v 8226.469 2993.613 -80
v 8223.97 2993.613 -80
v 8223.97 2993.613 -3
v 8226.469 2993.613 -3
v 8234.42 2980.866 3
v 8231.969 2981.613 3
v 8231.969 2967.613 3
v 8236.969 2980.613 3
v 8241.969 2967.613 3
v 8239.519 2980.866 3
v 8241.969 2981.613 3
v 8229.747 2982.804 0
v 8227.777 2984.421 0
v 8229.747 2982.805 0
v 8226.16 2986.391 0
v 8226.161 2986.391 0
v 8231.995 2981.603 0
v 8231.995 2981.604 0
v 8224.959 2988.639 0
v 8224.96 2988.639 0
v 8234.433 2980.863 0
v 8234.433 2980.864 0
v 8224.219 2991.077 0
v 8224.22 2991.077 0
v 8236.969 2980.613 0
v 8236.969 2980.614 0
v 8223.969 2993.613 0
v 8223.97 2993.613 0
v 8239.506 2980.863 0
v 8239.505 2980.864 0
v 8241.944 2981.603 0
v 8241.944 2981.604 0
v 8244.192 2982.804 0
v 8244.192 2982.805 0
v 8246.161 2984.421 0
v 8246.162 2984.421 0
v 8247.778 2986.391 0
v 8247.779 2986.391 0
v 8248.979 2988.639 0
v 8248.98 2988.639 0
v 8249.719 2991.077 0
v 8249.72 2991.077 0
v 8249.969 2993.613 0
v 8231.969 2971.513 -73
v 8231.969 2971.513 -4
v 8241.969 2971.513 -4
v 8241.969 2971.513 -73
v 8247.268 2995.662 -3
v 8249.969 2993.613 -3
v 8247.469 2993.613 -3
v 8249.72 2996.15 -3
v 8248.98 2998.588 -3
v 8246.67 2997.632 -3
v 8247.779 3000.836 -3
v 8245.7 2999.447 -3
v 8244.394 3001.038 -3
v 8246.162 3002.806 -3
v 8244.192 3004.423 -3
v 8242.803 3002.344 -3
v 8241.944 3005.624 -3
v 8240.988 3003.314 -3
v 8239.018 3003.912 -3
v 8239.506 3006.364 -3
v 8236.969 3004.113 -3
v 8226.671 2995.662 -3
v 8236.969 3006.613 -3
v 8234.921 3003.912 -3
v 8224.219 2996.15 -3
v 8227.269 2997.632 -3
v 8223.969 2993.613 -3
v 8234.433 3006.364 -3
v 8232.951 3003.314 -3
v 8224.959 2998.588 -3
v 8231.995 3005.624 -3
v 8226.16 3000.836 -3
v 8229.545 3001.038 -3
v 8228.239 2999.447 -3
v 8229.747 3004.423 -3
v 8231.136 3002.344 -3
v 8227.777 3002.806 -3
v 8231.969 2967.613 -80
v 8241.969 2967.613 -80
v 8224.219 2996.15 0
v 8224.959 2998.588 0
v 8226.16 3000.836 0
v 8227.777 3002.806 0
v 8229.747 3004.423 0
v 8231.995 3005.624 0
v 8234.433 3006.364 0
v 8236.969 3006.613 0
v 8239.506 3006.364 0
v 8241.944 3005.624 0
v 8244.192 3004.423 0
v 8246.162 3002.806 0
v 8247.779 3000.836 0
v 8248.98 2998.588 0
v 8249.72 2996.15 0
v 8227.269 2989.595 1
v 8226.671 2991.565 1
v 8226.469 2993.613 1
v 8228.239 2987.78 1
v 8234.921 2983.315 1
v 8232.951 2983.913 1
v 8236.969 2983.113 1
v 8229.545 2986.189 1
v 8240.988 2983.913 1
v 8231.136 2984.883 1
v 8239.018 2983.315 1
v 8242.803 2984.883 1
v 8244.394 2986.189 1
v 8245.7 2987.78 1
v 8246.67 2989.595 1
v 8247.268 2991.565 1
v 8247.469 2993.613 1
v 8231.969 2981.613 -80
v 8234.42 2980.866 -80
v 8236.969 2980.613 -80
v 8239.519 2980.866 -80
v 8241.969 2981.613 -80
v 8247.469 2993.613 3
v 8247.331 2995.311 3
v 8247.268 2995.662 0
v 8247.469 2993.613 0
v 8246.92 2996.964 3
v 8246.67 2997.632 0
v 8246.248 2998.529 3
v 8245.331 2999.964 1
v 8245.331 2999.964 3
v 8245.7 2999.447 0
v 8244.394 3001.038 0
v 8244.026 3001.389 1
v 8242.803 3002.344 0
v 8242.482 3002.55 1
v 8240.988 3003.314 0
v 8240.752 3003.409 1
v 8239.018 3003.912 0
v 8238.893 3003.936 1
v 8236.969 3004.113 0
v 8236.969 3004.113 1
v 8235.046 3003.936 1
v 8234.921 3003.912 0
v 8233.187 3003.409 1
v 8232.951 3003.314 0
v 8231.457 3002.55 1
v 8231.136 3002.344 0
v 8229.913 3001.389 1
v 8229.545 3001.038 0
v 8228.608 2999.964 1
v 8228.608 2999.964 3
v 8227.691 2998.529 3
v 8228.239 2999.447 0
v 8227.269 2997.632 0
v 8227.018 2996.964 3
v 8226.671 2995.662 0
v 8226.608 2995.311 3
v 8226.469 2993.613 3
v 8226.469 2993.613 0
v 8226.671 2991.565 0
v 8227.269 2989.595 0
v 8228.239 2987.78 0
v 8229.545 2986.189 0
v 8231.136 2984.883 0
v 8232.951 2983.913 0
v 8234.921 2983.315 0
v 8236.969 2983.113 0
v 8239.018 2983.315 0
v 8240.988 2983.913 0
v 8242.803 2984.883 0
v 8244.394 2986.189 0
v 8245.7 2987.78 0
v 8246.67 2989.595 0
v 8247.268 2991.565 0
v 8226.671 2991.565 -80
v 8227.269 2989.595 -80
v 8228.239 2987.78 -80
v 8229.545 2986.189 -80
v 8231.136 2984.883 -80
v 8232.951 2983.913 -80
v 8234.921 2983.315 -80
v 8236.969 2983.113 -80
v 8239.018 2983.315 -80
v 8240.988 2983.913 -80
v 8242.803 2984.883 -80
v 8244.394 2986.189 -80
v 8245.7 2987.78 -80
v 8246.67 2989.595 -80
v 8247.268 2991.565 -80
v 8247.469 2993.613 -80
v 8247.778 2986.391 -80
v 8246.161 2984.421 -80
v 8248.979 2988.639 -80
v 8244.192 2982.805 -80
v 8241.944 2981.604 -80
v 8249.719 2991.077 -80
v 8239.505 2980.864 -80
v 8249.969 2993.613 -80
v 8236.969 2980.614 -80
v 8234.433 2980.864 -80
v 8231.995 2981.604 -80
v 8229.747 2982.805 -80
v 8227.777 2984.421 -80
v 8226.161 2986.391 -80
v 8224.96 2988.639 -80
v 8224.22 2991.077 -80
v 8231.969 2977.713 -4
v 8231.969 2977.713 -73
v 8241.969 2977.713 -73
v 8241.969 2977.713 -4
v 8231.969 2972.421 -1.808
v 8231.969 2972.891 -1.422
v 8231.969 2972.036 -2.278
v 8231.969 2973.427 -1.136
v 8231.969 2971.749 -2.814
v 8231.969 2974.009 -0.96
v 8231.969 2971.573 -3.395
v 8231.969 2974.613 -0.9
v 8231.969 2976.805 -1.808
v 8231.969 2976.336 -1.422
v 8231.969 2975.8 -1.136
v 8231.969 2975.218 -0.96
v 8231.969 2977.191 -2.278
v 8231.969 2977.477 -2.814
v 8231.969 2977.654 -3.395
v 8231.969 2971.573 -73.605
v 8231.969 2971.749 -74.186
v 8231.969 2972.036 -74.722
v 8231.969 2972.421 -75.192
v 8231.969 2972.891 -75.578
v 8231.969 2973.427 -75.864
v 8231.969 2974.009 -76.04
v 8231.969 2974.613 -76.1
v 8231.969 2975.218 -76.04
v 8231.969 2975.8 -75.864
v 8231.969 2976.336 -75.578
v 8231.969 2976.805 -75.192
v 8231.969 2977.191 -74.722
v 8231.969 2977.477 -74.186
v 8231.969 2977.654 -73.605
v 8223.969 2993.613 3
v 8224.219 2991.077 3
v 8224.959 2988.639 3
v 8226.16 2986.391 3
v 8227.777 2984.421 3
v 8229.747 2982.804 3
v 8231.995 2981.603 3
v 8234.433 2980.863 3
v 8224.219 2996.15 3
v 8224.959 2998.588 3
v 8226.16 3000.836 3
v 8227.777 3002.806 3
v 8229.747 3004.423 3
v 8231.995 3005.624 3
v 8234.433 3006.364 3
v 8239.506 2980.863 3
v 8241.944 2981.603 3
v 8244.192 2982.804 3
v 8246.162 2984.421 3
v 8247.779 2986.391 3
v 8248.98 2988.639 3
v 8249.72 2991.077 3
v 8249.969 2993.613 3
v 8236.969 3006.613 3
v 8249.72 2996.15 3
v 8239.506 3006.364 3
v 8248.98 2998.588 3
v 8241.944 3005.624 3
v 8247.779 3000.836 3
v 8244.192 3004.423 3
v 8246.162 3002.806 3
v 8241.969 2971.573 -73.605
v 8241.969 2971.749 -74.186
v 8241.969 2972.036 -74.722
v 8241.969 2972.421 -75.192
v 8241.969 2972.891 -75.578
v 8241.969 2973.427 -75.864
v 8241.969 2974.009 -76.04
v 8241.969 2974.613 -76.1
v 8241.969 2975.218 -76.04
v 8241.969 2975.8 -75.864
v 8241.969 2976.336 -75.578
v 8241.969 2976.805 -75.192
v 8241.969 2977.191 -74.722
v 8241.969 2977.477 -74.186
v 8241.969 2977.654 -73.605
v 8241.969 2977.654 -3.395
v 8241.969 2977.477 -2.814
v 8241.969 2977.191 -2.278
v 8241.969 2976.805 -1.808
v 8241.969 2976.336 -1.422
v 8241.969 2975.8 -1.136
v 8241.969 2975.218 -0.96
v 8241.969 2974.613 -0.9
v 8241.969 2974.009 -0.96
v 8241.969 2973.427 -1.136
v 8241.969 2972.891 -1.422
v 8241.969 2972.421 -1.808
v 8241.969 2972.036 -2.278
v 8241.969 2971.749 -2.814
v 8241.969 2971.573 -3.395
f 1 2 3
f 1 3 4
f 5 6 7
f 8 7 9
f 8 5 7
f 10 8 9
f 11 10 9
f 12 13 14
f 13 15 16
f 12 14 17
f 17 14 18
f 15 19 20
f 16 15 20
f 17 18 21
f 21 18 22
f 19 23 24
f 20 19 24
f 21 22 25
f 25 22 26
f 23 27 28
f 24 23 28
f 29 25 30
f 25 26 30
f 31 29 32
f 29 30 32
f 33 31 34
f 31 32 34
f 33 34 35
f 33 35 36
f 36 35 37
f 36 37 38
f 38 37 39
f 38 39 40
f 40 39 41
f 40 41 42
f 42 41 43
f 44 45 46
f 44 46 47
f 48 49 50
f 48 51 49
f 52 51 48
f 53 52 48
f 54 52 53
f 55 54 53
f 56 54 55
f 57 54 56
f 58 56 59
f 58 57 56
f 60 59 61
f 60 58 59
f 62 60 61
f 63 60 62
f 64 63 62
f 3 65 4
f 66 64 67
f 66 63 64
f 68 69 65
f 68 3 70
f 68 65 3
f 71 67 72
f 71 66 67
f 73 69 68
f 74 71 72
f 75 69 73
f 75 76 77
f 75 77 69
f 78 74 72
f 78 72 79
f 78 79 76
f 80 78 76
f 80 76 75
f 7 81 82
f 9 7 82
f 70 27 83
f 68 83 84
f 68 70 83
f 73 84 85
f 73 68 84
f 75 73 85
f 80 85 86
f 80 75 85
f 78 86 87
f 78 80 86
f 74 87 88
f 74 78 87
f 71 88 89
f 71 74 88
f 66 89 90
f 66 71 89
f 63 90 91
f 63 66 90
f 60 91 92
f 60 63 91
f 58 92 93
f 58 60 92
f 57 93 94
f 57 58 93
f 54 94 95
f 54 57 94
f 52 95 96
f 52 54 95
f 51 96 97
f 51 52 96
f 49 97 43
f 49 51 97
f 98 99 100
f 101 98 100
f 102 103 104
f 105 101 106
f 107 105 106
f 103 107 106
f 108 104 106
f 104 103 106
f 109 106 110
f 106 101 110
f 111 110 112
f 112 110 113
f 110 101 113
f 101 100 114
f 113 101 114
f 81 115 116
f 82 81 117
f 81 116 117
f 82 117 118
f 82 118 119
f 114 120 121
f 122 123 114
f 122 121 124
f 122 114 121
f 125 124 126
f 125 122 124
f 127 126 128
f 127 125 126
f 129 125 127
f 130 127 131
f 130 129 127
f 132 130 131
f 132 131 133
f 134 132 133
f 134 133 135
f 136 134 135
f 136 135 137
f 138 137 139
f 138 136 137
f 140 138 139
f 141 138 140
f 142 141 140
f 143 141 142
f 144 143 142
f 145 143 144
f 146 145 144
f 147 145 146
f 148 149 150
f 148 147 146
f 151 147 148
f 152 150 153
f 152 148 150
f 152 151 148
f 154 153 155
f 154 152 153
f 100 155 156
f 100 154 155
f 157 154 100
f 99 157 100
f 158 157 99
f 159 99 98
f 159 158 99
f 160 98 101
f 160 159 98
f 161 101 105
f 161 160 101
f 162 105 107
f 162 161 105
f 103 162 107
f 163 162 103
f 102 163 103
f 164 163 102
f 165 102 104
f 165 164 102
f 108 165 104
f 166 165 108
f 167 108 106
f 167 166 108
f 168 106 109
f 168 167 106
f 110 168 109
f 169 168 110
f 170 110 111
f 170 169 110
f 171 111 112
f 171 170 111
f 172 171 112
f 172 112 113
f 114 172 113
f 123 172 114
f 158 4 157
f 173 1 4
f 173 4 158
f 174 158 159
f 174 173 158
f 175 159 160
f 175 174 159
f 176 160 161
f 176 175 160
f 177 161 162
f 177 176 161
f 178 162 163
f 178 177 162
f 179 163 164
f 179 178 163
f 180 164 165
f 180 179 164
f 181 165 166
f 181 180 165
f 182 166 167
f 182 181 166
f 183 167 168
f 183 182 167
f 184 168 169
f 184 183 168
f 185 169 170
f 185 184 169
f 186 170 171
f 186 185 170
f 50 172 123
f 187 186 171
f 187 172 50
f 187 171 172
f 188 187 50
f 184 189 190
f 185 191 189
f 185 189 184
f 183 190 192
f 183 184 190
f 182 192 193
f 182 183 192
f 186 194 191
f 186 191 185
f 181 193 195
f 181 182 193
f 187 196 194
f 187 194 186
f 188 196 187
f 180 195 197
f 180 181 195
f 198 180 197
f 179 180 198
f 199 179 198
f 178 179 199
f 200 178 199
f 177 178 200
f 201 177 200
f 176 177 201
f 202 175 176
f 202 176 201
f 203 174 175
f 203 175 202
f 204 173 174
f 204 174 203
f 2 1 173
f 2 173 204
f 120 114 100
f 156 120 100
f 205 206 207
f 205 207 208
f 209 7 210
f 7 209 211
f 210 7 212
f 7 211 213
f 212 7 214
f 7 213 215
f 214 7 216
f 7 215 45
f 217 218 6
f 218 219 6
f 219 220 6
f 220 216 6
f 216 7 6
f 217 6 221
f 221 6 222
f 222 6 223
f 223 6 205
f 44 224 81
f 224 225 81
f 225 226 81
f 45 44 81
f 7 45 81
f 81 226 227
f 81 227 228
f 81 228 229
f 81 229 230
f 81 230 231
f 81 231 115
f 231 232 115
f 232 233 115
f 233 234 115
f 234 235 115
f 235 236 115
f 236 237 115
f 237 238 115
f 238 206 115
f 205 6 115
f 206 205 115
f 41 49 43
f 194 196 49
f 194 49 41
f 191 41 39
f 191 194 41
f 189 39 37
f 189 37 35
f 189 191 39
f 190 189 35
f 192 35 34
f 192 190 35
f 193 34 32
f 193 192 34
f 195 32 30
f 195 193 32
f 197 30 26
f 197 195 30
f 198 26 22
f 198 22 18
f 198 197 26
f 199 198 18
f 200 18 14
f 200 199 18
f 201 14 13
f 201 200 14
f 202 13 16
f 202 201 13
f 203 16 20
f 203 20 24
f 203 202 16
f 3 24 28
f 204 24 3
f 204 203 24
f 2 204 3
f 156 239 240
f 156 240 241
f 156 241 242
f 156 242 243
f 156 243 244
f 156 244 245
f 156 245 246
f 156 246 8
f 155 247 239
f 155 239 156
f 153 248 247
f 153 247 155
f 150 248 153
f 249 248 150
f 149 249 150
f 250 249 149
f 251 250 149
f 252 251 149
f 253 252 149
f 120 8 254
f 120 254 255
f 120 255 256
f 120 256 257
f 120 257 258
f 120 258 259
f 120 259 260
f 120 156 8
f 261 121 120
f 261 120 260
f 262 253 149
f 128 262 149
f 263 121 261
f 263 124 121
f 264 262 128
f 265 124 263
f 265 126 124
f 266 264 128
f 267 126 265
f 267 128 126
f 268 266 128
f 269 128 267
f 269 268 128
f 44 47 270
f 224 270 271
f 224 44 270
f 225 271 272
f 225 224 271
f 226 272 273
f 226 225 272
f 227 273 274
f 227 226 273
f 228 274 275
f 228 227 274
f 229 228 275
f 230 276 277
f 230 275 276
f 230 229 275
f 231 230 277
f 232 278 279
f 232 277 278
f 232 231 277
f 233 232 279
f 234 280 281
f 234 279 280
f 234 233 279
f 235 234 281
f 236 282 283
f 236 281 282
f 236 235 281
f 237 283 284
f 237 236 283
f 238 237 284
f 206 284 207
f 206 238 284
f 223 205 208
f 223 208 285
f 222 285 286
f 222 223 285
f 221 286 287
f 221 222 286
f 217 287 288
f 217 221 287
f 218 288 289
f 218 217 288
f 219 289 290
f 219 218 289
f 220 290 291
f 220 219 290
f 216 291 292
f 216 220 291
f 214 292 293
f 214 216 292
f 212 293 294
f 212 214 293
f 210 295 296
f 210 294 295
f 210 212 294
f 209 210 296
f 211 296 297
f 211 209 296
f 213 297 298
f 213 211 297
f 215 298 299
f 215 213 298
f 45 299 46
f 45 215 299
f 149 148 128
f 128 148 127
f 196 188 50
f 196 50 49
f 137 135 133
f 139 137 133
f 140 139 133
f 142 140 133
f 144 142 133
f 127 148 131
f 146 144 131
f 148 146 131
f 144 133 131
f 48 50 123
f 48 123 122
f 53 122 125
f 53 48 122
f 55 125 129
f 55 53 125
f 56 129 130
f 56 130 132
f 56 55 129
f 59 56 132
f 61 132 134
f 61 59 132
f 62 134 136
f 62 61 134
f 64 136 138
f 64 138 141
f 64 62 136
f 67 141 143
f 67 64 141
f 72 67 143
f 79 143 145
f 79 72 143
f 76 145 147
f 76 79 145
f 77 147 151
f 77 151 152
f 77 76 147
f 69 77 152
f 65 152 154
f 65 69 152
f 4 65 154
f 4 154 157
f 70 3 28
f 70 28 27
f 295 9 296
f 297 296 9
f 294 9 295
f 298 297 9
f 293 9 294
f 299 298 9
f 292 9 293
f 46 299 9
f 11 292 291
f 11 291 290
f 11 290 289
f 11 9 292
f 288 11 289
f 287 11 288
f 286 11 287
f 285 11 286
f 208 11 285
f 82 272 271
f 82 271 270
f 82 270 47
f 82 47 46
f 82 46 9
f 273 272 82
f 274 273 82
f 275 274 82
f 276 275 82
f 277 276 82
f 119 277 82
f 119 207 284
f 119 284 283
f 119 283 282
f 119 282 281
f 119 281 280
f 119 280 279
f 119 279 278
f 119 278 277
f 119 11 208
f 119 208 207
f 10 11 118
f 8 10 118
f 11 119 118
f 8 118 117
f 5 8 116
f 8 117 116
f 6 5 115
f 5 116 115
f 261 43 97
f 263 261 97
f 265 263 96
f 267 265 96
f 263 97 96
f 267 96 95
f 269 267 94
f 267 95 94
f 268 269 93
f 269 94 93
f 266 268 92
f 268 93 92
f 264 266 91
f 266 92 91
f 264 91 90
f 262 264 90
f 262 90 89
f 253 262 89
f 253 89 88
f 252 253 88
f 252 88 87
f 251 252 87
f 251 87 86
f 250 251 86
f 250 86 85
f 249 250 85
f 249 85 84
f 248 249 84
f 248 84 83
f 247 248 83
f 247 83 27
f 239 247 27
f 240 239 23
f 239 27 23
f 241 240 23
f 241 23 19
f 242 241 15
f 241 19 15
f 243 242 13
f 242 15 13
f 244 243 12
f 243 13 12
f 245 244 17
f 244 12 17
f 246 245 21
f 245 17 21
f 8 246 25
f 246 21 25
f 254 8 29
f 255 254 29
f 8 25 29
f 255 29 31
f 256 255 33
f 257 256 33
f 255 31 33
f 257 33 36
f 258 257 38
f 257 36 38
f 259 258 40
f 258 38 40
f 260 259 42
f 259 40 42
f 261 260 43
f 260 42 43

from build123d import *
from build123d.topology import SkipClean

# Parameters (mm, degrees)
SKETCH_2_R       = 13
SKETCH_2_R_2     = 10.5
EXTRUDE_1_DEPTH  = 3
EXTRUDE_START    = -2
EXTRUDE_3_DEPTH  = 2
EXTRUDE_START_2  = 80
EXTRUDE_5_DEPTH  = 80
EXTRUDE_START_3  = 3
EXTRUDE_6_DEPTH  = 3
SKETCH_7_W       = 10
SKETCH_7_H       = 83
EXTRUDE_8_DEPTH  = 26
EXTRUDE_9_DEPTH  = 18
SKETCH_9_R       = 13
EXTRUDE_10_DEPTH = 94


with BuildPart() as part:
    # 草图2 → 凸台-拉伸1 (new body)
    with BuildSketch(Plane.XY):
        with Locations((8236.969436473, 2993.613410171)):
            Circle(SKETCH_2_R)
        with Locations((8236.969436473, 2993.613410171)):
            Circle(SKETCH_2_R_2, mode=Mode.SUBTRACT)
    extrude(amount=EXTRUDE_1_DEPTH)

    # 草图3 → 凸台-拉伸3 (add)
    with BuildSketch(Plane.XY.offset(3).offset(EXTRUDE_START)):
        with BuildLine():
            Line((8247.469436473, 2993.613410171), (8226.469436473, 2993.613410171))
            ThreePointArc((8226.469436473, 2993.613410171), (8236.969436473, 2983.113410171), (8247.469436473, 2993.613410171))
        make_face()
        with BuildLine():
            Line((8228.607869965, 2999.9643318), (8245.331002981, 2999.9643318))
            ThreePointArc((8245.331002981, 2999.9643318), (8236.969436473, 3004.113410171), (8228.607869965, 2999.9643318))
        make_face()
    extrude(amount=EXTRUDE_3_DEPTH)

    # 草图5 → 凸台-拉伸5 (add)
    with BuildSketch(Plane(origin=(0, 0, 0), x_dir=(-1, 0, 0), z_dir=(0, 0, -1)).offset(EXTRUDE_START_2)):
        with BuildLine():
            Line((-8247.469436473, 2993.613410171), (-8249.968865573, 2993.613410171))
            ThreePointArc((-8249.968865573, 2993.613410171), (-8236.969436473, 2980.61398107), (-8223.970007373, 2993.613410171))
            Line((-8223.970007373, 2993.613410171), (-8226.469436473, 2993.613410171))
            ThreePointArc((-8226.469436473, 2993.613410171), (-8236.969436473, 2983.113410171), (-8247.469436473, 2993.613410171))
        make_face()
    extrude(amount=-EXTRUDE_5_DEPTH)

    # 草图6 → 凸台-拉伸6 (add)
    with SkipClean():  # the faces are left unmerged after this step: merging them gives an invalid solid
        with BuildSketch(Plane(origin=(0, 0, 0), x_dir=(-1, 0, 0), z_dir=(0, 0, -1)).offset(EXTRUDE_START_3)):
            with BuildLine():
                Line((-8249.969436473, 2993.613410171), (-8247.469436473, 2993.613410171))
                ThreePointArc((-8247.469436473, 2993.613410171), (-8236.969436473, 3004.113410171), (-8226.469436473, 2993.613410171))
                Line((-8226.469436473, 2993.613410171), (-8223.969436473, 2993.613410171))
                ThreePointArc((-8223.969436473, 2993.613410171), (-8236.969436473, 3006.613410171), (-8249.969436473, 2993.613410171))
            make_face()
        extrude(amount=-EXTRUDE_6_DEPTH)


with BuildPart() as body_2:
    # 草图7 → 凸台-拉伸8 (new body)
    with BuildSketch(Plane(origin=(0, 2993.613410171, 0), x_dir=(1, 0, 0), z_dir=(0, 1, 0))):
        with Locations((8236.969436473, 38.5)):
            Rectangle(SKETCH_7_W, SKETCH_7_H)
    extrude(amount=-EXTRUDE_8_DEPTH)


with BuildPart() as body_3:
    # 草图8 → 凸台-拉伸9 (new body)
    with BuildSketch(Plane.ZY.offset(-8231.969436473)):
        with BuildLine():
            Line((-73, 2977.713410171), (-4, 2977.713410171))
            ThreePointArc((-4, 2977.713410171), (-0.9, 2974.613410171), (-4, 2971.513410171))
            Line((-4, 2971.513410171), (-73, 2971.513410171))
            ThreePointArc((-73, 2971.513410171), (-76.1, 2974.613410171), (-73, 2977.713410171))
        make_face()
    extrude(amount=-EXTRUDE_9_DEPTH)


with BuildPart() as body_2_1:
    add(body_2.part)

    # Combine 1: cut body 3
    add(body_3.part, mode=Mode.SUBTRACT)


with BuildPart() as body_3_2:
    # 草图9 → 凸台-拉伸10 (new, symmetric)
    with BuildSketch(Plane(origin=(0, 0, -3), x_dir=(-1, 0, 0), z_dir=(0, 0, -1))):
        with Locations((-8236.969436473, 2993.613410171)):
            Circle(SKETCH_9_R)
    extrude(amount=EXTRUDE_10_DEPTH, both=True)


with BuildPart() as body_2_2:
    add(body_2_1.part)

    # Combine 2: cut body 3 2
    add(body_3_2.part, mode=Mode.SUBTRACT)


solid = Compound([part.part, body_2_2.part])
